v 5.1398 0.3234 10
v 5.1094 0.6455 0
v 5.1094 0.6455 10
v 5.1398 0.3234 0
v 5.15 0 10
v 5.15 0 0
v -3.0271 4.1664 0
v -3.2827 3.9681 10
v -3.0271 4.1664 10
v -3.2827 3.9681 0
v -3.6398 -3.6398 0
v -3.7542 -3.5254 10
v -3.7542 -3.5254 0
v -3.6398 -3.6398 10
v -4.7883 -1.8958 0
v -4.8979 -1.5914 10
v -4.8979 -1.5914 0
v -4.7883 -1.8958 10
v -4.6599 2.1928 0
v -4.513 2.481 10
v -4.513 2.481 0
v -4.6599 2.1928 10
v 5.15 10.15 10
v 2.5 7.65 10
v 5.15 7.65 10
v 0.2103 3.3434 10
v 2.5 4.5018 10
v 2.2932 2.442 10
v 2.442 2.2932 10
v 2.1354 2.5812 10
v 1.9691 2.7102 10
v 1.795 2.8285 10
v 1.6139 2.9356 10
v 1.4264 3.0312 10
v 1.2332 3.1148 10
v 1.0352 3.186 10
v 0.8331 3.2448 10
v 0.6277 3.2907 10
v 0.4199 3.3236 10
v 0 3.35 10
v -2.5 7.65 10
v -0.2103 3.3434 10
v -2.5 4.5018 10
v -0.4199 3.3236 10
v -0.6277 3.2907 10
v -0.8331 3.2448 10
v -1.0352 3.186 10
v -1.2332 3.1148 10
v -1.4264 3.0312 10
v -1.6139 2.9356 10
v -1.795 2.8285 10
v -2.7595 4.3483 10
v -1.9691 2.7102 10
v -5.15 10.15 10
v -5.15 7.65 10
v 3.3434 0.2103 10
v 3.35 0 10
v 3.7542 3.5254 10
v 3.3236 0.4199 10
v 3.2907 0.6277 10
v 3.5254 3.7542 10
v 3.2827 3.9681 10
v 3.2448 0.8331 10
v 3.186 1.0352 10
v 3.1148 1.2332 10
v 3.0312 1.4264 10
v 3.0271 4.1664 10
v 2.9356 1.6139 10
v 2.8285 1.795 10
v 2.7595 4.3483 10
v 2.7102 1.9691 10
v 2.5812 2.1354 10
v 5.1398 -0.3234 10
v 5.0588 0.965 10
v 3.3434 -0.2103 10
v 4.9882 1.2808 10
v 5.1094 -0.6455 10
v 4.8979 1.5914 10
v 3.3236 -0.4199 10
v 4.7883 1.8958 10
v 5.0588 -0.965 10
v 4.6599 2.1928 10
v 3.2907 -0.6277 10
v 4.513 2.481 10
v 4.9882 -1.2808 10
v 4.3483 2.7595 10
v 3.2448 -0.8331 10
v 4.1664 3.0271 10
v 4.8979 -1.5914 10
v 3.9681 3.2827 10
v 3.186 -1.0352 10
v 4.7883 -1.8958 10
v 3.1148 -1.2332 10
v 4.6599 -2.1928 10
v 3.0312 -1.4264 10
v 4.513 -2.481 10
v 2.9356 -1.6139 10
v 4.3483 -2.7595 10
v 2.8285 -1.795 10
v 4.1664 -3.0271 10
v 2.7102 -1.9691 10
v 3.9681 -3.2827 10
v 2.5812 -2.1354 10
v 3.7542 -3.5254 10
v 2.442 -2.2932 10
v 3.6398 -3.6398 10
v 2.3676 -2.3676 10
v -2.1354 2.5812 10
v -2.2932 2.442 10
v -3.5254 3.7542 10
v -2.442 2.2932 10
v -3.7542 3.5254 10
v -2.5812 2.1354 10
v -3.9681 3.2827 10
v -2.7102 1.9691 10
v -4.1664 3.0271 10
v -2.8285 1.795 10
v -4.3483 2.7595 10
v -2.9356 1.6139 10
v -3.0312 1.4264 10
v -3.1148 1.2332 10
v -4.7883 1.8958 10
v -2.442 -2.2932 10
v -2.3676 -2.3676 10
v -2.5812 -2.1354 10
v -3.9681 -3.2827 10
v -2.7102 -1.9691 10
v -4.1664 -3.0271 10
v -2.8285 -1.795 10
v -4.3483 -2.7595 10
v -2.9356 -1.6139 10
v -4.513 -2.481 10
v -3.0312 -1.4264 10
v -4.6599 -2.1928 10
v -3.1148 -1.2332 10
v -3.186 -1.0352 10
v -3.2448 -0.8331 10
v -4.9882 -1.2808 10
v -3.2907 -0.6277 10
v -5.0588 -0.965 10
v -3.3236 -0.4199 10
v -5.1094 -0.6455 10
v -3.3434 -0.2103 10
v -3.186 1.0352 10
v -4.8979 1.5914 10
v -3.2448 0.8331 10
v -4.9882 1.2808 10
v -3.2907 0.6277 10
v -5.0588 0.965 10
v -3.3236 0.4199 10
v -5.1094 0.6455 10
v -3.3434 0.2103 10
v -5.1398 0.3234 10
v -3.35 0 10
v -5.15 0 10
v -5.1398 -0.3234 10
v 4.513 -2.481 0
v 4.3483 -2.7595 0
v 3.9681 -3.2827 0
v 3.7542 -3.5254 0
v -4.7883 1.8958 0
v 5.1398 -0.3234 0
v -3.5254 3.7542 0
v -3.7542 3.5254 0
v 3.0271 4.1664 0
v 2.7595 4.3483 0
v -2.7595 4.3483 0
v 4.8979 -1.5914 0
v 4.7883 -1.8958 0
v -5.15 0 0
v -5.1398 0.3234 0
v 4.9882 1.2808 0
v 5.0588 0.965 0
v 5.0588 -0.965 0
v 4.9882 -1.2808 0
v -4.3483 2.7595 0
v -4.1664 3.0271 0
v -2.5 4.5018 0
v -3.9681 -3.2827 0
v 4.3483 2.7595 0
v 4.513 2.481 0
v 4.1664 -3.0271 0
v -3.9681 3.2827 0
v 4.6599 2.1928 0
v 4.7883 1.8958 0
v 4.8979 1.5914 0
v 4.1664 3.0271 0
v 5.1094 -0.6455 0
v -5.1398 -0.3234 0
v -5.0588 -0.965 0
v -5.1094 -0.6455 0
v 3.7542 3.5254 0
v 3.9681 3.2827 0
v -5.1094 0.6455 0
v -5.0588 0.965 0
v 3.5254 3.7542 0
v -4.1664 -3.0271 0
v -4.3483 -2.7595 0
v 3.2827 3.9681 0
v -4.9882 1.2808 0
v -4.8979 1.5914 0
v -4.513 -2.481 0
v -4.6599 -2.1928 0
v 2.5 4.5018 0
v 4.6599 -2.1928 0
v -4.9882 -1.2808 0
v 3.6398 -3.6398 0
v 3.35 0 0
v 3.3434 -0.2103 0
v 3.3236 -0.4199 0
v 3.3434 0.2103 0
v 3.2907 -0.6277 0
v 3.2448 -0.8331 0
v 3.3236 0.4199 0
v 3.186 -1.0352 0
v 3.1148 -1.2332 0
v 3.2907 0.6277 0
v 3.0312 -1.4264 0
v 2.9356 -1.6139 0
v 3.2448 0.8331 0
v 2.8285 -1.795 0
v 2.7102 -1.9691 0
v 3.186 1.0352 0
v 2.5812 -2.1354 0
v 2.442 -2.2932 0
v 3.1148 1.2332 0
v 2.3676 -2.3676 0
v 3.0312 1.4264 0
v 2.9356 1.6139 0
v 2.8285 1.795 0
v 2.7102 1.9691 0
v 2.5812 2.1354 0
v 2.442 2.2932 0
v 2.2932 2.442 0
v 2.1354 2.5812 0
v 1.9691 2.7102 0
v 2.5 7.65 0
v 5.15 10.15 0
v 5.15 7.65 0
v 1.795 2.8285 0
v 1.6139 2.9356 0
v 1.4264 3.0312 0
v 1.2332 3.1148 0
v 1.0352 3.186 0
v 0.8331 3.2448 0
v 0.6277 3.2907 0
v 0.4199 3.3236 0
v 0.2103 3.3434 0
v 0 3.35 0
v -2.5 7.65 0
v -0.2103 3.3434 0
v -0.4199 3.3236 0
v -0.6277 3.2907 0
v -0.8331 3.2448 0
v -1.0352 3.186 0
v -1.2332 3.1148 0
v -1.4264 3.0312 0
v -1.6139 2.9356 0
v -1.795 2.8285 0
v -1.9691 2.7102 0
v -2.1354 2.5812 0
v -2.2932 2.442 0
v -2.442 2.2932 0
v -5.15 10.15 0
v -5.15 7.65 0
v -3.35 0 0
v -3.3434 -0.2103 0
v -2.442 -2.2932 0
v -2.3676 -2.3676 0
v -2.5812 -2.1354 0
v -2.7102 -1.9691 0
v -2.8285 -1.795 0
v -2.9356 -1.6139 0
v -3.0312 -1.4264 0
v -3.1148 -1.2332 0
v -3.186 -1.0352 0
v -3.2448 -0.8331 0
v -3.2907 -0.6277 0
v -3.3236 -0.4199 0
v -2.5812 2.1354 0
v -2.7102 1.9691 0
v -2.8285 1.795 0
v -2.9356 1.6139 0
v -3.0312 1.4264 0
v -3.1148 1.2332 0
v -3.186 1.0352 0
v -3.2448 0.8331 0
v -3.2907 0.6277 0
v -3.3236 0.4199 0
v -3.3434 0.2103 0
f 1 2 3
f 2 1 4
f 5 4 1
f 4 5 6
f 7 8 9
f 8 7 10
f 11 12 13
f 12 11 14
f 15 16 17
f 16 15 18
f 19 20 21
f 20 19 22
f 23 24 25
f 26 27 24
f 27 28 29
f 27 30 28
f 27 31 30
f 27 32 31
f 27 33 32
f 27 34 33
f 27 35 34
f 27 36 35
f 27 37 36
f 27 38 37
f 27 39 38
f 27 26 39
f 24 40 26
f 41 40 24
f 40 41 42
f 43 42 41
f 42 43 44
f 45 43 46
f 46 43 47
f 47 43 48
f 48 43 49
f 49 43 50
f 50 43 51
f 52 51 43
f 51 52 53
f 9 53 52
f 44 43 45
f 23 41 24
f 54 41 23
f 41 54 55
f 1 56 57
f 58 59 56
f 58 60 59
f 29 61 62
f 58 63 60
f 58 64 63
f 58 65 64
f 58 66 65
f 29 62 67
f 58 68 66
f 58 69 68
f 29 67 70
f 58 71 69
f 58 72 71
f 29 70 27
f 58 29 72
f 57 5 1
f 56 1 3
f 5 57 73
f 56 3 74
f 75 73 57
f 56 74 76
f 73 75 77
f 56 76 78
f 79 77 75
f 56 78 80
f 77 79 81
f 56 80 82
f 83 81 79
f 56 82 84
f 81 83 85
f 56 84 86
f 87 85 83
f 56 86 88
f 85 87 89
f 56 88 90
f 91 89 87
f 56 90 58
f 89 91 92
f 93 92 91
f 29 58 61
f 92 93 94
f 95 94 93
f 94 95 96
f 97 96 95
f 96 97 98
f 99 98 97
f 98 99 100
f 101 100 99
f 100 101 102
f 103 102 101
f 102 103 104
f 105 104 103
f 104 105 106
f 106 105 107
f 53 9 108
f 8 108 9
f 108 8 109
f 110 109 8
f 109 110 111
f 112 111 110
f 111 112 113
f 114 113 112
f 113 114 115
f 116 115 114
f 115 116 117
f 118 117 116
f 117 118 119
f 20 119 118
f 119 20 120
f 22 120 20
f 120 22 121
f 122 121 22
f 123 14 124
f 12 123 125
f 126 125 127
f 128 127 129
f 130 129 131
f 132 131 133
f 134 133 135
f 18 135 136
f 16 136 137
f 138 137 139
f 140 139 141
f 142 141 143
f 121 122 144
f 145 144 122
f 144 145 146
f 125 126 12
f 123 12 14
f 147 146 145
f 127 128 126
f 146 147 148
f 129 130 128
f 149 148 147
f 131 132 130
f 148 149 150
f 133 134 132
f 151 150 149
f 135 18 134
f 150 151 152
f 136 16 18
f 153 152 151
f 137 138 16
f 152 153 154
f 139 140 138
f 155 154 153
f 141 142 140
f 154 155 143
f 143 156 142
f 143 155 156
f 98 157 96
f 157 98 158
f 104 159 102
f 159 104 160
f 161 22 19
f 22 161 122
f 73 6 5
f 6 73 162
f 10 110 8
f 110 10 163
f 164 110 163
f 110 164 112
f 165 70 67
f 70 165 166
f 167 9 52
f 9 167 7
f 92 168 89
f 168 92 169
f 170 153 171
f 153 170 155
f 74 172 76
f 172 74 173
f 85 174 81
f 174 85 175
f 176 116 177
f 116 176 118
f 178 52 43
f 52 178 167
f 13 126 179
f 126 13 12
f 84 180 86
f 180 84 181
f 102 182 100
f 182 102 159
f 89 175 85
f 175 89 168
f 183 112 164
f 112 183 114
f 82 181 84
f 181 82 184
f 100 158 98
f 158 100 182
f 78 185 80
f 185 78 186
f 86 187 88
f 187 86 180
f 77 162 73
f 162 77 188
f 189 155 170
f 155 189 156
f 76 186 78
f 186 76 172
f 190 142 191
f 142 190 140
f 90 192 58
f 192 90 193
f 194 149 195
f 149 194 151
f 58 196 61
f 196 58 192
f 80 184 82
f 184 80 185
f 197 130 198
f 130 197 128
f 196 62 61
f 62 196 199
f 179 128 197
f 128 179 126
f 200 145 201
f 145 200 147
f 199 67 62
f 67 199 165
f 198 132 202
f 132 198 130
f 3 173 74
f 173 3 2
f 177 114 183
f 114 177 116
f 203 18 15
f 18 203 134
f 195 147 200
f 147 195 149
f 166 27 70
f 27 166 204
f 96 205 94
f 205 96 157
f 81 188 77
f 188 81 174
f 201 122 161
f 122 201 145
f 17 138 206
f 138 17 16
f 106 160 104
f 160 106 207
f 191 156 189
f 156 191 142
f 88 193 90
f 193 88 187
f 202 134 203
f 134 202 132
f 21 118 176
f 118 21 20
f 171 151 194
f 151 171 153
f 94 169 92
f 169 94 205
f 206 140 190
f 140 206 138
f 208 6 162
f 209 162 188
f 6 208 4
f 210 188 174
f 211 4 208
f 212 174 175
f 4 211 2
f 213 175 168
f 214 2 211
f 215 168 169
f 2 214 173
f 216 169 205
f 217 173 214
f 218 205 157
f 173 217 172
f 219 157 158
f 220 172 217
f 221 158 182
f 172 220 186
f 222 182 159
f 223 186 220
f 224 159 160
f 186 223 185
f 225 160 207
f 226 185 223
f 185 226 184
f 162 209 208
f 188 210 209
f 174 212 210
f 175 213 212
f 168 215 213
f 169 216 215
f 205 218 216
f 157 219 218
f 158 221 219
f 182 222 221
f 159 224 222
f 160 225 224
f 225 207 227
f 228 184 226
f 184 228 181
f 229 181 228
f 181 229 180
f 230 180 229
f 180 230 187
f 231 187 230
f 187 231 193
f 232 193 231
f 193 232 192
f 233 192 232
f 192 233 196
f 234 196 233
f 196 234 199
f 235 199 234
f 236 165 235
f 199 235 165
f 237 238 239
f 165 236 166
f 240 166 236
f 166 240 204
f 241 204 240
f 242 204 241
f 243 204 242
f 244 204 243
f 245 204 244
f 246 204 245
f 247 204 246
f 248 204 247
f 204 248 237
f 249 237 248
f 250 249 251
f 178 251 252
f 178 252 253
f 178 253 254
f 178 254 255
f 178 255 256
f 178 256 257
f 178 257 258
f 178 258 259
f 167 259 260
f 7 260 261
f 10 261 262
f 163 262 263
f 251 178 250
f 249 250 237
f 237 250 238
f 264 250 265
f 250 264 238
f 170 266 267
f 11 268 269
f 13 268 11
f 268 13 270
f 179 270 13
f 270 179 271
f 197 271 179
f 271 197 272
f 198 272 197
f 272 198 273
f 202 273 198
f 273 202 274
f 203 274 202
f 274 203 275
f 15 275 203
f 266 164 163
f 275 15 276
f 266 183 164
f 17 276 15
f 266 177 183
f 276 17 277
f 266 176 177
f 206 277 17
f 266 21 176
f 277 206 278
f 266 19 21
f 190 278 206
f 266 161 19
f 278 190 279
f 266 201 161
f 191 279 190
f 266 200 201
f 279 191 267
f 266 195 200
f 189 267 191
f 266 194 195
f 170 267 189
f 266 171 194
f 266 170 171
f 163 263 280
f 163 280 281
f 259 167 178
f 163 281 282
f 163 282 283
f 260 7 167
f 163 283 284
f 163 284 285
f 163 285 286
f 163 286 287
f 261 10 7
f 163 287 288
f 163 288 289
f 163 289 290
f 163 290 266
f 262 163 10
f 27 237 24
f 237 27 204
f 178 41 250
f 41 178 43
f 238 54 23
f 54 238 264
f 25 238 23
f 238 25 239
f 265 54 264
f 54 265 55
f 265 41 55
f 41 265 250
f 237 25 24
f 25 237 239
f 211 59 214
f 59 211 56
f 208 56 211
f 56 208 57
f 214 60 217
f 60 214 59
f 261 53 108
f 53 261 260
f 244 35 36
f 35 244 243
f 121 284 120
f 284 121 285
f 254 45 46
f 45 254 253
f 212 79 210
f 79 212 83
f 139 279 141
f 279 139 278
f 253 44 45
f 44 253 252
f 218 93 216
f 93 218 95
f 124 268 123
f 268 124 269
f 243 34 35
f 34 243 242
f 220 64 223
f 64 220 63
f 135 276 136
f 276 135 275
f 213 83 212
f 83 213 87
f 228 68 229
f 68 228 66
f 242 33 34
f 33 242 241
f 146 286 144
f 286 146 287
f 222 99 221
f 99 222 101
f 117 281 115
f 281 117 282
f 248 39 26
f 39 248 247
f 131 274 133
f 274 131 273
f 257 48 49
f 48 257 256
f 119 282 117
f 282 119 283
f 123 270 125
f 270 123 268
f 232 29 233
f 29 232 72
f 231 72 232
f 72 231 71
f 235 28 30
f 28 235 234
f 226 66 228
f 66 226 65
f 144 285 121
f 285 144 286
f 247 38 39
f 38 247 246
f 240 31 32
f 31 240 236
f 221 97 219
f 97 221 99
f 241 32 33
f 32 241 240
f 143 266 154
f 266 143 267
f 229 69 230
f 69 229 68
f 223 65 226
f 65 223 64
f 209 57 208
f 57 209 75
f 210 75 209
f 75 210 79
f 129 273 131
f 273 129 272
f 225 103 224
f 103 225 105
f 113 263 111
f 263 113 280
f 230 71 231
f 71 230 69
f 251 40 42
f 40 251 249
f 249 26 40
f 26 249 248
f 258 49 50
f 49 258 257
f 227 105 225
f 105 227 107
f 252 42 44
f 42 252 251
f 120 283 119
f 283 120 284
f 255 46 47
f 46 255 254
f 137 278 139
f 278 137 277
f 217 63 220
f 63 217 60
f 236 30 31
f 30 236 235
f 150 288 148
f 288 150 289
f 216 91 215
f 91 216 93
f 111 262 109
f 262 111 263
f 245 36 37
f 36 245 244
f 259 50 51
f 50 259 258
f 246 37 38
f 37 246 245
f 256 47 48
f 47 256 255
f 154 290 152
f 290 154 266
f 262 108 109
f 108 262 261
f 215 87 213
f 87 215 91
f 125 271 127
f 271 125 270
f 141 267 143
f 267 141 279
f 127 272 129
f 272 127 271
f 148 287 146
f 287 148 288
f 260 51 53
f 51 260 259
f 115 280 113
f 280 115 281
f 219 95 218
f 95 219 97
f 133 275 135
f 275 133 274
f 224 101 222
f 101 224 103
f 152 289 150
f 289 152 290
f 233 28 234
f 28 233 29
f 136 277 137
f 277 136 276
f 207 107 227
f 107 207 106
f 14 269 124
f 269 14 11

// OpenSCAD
d = 6.7;
wall = 1.8;

difference(){
    union(){
        cylinder( d = d + 2 * wall, h = 10, $fn = 100 );
        translate( [ -2.5, 0, 0 ] )
            cube( [ 5, d / 2 + wall + 5, 10 ] );
        translate( [ -( d / 2 + wall ), d / 2 + wall + 5 - 2.5, 0 ] )
            cube( [ d + 2 * wall, 2.5, 10 ] );
    }
    translate( [ 0, 0, -1 ] )
        cylinder( d = d, h = 12, $fn = 100 );
   rotate( -135, [ 0, 0, 1 ] )
       translate( [ 0, 0, -1 ] )
            cube( [ 100, 100, 100 ] );
}
